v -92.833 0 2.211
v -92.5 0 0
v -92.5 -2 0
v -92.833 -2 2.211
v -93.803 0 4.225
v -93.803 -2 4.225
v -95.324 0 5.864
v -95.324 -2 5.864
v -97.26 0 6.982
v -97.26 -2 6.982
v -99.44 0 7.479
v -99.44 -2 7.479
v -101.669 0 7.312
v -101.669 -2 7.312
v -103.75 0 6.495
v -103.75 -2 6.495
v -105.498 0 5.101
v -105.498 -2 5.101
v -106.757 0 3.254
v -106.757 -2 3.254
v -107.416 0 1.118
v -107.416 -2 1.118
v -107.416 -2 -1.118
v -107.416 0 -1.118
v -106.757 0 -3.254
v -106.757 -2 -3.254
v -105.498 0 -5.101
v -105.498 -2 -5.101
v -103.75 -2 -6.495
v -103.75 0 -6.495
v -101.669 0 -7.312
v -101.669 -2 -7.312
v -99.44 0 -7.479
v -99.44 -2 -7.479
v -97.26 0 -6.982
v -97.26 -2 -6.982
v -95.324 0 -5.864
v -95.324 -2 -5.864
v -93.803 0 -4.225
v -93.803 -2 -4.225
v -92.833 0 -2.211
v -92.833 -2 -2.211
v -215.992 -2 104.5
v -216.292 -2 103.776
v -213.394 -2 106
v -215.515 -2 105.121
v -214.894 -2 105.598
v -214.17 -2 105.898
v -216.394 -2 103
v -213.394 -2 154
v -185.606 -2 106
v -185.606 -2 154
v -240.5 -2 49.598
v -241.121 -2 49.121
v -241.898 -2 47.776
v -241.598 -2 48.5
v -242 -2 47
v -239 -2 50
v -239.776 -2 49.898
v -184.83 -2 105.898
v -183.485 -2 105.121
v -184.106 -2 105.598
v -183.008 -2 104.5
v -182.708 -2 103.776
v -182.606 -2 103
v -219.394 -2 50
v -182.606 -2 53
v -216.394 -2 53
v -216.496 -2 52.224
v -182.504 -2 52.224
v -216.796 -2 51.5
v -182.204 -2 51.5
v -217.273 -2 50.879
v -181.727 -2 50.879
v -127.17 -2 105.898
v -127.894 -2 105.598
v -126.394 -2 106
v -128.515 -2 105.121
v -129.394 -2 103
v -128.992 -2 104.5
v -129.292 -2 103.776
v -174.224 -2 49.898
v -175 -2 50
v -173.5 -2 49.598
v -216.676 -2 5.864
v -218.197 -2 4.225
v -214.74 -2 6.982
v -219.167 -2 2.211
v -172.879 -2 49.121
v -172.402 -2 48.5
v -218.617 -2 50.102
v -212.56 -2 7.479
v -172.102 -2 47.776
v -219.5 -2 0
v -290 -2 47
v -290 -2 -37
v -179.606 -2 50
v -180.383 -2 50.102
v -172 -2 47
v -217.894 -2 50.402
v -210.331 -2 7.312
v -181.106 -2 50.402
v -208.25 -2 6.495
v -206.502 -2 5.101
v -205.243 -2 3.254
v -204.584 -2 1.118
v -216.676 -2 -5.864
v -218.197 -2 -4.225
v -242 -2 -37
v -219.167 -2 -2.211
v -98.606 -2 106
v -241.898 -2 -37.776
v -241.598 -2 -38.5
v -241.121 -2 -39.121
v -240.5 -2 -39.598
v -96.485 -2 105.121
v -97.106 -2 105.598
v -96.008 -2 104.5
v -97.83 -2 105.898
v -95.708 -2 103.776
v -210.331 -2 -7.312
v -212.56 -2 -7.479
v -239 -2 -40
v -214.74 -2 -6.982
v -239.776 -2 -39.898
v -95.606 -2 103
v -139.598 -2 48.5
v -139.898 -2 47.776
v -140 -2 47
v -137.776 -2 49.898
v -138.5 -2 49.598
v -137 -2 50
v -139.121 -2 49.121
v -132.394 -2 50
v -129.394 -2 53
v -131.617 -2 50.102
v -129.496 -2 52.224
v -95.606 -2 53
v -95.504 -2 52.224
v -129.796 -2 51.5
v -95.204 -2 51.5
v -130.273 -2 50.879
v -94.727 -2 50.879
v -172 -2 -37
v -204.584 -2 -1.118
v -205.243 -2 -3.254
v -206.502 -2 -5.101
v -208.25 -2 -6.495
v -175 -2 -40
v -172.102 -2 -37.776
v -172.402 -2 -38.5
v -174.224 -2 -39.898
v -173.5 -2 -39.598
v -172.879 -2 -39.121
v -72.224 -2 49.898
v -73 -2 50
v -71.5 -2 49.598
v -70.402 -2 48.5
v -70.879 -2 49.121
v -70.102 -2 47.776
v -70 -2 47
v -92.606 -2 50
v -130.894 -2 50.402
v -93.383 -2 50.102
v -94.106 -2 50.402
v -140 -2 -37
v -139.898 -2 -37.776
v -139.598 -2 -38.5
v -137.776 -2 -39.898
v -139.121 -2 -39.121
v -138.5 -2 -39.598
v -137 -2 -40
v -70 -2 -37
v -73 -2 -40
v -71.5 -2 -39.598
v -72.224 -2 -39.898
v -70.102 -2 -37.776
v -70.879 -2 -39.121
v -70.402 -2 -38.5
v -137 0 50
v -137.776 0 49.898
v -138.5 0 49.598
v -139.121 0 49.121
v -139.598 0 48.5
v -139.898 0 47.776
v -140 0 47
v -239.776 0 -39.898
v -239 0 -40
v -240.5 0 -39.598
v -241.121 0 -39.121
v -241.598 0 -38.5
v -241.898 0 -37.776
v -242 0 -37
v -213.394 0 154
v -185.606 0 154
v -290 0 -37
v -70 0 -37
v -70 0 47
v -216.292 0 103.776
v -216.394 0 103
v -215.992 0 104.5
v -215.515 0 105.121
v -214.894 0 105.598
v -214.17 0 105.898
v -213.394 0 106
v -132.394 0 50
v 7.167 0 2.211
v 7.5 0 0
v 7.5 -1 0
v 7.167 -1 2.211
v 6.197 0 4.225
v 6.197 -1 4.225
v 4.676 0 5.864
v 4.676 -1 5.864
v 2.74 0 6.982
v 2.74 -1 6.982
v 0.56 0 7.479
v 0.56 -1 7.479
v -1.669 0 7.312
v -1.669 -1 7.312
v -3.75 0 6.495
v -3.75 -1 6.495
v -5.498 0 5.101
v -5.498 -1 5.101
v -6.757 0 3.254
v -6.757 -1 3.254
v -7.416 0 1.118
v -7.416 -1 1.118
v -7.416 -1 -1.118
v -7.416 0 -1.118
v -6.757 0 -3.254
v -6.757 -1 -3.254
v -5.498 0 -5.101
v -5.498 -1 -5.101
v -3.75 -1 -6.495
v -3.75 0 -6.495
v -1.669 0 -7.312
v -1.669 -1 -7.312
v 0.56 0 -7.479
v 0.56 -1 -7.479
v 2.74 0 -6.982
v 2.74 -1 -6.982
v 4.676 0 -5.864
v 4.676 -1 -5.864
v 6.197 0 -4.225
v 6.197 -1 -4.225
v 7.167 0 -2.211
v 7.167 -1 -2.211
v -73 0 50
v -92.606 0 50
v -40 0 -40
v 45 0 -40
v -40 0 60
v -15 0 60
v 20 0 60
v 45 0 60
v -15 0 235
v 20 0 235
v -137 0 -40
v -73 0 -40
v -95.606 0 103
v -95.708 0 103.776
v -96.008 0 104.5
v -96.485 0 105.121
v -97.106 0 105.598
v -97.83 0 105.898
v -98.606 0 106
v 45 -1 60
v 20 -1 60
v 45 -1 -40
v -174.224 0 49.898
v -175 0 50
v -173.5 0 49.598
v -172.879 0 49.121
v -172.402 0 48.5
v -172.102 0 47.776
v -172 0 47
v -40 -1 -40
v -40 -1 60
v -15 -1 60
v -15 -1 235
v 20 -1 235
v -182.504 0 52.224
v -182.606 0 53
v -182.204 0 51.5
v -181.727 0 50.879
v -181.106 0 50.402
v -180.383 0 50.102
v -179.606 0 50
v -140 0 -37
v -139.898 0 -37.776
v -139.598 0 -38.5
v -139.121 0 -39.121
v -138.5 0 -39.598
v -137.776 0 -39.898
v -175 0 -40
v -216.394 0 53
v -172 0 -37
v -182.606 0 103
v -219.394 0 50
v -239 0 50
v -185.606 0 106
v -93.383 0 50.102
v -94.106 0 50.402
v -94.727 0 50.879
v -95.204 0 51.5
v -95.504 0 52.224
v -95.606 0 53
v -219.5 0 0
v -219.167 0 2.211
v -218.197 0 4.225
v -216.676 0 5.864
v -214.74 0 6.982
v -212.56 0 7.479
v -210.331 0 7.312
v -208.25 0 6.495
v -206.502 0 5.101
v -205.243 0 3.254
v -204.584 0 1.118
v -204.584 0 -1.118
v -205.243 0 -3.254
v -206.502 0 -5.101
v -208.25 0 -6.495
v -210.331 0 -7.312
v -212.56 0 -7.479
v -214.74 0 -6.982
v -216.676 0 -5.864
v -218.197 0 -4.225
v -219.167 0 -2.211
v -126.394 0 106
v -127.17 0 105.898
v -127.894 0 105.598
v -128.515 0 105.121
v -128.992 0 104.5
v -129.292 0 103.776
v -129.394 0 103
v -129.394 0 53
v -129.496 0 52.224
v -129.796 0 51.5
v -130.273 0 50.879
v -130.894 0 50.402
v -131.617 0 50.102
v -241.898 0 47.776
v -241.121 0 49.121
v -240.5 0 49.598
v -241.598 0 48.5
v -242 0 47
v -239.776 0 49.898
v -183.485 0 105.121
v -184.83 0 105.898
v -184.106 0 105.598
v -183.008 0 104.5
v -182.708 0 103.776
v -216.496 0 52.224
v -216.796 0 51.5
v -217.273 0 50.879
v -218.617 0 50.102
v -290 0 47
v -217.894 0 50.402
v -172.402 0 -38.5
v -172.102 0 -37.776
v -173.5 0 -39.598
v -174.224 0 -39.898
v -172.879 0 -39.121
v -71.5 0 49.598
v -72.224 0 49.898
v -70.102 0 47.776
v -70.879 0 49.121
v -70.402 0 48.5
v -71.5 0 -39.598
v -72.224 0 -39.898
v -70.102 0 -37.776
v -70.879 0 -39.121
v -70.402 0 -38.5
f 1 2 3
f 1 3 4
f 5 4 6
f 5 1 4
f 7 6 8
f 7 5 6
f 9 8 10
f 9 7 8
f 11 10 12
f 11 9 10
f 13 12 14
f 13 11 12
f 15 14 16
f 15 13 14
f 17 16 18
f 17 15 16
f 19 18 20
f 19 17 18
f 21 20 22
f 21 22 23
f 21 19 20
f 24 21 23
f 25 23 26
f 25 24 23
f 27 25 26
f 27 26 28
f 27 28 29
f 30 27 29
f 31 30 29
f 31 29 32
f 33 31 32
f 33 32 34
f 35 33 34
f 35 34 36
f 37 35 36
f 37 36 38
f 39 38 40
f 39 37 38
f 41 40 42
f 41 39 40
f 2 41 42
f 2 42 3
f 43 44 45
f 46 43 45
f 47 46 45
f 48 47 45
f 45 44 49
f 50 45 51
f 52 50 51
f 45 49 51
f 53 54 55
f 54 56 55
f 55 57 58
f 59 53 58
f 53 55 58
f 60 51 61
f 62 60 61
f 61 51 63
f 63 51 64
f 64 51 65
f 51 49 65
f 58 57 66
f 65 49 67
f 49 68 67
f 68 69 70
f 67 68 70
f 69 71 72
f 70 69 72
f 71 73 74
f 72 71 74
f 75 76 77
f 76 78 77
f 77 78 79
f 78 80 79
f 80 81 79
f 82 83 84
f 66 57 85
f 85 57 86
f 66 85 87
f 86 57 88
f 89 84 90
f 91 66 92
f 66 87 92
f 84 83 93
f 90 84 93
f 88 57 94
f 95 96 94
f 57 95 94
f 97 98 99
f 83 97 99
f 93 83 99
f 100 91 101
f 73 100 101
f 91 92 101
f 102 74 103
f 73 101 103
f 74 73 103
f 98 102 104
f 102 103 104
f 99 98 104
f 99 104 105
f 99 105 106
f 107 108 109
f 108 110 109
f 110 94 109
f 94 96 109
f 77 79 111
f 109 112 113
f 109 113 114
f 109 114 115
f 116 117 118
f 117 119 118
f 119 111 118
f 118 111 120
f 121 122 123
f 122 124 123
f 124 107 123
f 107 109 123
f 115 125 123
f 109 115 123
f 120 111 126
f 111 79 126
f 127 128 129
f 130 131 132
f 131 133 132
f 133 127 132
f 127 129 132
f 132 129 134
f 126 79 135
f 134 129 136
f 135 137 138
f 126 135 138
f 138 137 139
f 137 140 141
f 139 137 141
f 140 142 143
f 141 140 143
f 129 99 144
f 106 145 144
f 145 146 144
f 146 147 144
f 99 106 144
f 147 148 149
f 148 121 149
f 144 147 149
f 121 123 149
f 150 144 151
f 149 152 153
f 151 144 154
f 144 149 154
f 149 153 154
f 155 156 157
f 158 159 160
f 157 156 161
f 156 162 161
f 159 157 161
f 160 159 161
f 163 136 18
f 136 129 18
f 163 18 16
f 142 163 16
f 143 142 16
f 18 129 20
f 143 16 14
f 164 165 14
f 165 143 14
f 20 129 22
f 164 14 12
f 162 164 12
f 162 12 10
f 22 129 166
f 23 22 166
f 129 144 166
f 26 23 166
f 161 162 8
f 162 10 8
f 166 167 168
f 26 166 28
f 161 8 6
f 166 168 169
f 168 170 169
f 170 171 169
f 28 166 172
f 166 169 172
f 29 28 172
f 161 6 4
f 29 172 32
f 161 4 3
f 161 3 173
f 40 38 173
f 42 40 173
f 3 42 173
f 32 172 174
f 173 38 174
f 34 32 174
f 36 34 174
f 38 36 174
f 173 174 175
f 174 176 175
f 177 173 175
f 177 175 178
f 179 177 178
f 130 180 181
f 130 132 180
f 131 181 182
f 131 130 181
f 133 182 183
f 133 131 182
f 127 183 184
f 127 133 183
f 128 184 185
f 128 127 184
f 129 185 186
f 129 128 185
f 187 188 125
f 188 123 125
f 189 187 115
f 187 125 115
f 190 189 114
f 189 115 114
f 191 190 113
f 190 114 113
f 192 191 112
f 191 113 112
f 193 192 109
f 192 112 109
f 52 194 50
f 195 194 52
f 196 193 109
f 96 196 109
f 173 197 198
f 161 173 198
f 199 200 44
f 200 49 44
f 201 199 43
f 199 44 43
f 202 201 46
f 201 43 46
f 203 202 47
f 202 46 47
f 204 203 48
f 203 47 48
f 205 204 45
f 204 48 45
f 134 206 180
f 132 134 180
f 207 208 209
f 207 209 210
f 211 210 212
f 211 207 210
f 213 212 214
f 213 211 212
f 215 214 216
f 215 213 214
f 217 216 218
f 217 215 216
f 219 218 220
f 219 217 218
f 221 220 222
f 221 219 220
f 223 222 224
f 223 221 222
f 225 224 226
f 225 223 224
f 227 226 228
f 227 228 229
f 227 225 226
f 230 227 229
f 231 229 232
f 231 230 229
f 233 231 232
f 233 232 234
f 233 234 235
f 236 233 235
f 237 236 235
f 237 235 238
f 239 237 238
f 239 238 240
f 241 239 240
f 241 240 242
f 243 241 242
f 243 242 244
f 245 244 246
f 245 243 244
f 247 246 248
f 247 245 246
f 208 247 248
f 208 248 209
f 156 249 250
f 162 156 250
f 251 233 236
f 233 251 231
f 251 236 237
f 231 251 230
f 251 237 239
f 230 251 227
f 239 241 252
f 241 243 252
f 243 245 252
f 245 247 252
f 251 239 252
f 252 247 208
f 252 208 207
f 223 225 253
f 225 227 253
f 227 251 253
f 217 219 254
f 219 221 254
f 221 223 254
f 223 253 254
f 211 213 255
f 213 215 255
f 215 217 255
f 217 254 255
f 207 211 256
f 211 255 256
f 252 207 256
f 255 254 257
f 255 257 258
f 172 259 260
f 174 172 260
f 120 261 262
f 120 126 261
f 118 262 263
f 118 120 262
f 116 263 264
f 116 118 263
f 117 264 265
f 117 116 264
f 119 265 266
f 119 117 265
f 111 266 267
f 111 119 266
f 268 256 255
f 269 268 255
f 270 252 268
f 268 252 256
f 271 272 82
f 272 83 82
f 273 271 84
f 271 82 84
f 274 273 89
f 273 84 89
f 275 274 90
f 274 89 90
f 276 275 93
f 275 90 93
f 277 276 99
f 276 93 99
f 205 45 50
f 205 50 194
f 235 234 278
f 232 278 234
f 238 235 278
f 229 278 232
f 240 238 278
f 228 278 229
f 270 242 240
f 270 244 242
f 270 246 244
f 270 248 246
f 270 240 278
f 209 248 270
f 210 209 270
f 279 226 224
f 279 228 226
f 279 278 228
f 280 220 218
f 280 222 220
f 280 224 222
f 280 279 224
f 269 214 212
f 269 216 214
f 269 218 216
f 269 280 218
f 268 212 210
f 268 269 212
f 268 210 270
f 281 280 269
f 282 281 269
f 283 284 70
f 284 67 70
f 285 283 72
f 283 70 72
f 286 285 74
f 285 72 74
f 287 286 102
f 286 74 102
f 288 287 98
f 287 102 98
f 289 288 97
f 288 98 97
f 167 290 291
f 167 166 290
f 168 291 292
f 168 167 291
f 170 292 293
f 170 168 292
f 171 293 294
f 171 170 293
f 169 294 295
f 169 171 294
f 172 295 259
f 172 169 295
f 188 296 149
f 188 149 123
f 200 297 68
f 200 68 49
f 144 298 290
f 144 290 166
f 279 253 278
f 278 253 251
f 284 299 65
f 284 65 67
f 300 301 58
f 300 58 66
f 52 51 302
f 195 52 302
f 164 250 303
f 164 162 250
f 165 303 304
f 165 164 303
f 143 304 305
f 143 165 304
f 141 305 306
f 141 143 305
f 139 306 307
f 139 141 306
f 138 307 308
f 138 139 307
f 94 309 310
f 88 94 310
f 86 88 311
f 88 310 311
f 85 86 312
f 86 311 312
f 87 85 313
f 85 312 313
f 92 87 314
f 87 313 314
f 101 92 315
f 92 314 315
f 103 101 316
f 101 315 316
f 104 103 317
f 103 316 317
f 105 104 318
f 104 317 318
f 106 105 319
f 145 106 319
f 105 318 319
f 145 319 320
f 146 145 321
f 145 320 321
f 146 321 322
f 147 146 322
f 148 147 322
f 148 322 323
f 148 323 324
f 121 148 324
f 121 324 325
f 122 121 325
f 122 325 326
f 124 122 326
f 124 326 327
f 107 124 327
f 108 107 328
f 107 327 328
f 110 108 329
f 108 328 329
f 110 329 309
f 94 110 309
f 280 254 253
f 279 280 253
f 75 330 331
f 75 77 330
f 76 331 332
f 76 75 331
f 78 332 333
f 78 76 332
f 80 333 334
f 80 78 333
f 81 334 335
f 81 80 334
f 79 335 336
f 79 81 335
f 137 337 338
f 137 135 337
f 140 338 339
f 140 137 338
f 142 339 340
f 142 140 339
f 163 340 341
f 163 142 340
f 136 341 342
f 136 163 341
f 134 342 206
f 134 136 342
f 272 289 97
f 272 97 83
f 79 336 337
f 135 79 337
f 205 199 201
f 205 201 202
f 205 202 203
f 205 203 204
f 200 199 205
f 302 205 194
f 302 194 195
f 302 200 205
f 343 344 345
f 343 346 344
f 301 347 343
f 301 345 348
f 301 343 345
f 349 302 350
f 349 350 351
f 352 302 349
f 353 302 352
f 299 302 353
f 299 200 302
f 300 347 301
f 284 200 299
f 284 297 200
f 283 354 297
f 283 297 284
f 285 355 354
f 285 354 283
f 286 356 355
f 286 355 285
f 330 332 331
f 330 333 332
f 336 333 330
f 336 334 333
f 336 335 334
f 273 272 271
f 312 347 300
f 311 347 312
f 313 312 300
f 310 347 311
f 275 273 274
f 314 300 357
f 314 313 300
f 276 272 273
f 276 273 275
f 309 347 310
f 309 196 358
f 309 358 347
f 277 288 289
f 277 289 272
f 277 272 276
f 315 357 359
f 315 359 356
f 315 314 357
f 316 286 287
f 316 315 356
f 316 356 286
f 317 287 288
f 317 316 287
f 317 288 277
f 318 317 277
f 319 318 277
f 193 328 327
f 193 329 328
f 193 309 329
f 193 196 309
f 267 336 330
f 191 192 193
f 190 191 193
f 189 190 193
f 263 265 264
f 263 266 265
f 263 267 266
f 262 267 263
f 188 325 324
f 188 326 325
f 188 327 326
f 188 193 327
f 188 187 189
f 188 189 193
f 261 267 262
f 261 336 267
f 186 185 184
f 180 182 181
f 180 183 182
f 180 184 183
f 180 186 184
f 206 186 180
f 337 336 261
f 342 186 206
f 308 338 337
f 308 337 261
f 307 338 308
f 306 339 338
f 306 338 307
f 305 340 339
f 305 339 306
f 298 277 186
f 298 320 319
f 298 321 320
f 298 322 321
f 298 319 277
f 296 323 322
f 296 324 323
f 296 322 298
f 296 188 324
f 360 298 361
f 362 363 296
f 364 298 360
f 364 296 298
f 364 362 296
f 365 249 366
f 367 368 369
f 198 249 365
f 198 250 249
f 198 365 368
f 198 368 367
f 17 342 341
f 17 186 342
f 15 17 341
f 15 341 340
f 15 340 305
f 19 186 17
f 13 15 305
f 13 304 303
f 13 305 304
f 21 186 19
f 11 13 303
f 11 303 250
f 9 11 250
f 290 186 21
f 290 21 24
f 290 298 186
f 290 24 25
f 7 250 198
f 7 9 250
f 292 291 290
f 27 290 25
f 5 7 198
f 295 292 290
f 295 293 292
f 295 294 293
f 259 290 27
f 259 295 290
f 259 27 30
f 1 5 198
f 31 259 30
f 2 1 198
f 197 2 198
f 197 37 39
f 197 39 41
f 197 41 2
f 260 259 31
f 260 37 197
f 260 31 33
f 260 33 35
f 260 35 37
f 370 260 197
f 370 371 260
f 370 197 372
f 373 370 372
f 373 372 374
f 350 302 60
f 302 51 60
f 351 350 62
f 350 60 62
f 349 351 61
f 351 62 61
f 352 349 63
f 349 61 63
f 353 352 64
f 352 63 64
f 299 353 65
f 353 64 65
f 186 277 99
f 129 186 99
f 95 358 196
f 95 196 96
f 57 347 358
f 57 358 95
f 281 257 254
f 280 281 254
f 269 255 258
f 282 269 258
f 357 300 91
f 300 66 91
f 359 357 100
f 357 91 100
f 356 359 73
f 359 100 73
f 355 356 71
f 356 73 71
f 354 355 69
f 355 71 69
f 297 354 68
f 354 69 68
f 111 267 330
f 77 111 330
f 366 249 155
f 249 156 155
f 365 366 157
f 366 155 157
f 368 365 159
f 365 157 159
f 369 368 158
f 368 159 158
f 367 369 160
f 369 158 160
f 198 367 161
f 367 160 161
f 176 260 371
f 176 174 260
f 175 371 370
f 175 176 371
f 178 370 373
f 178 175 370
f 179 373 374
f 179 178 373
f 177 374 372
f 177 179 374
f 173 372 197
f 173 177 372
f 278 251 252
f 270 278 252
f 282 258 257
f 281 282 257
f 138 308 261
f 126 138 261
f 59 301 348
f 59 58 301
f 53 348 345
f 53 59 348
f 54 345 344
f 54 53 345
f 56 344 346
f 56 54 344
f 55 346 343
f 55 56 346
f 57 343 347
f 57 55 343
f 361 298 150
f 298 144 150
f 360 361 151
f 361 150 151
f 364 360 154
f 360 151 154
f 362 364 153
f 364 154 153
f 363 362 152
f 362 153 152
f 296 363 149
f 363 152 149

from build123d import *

# Parameters (mm, degrees)
F0_R      = 7.5
F1_DEPTH  = 1
F2_R      = 7.5
F2_W      = 19
F2_H      = 48
F2_H_2    = 20
F3_DEPTH  = 2
F4_R      = 3
F5_W      = 2
F5_H      = 84
F6_DEPTH  = 16
F8_W      = 2
F8_H      = 84
F9_DEPTH  = 48
F10_W     = 27.787754
F10_H     = 2
F11_DEPTH = 48


with BuildPart() as f1:
    # F0 (on Front) → F1 (new body)
    with BuildSketch(Plane.XZ):
        Polygon((45, 60), (20, 60), (20, 235), (-15, 235), (-15, 60), (-40, 60), (-40, -40), (45, -40), align=None)
        Circle(F0_R, mode=Mode.SUBTRACT)
    extrude(amount=F1_DEPTH)


with BuildPart() as f3:
    # F2 (on Front) → F3 (new body)
    with BuildSketch(Plane.XZ):
        Polygon((-103, 50), (-103, 30), (-122, 30), (-122, 50), (-129.393877, 50), (-140, 50), (-140, -40), (-70, -40), (-70, 50), (-95.606123, 50), align=None)
        with Locations((-100, 0)):
            Circle(F2_R, mode=Mode.SUBTRACT)
        Polygon((-103, 98), (-103, 50), (-95.606123, 50), (-95.606123, 106), (-129.393877, 106), (-129.393877, 50), (-122, 50), (-122, 98), align=None)
        with Locations((-112.5, 74)):
            Rectangle(F2_W, F2_H)
        with Locations((-112.5, 40)):
            Rectangle(F2_W, F2_H_2)
    extrude(amount=F3_DEPTH)

    # F4
    f4_edges = [f3.edges().sort_by_distance(p)[0] for p in [
        (-129.393877, -1, 50),
        (-129.393877, -1, 106),
        (-95.606123, -1, 106),
        (-95.606123, -1, 50),
        (-70, -1, 50),
        (-140, -1, 50),
        (-140, -1, -40),
        (-70, -1, -40),
    ]]
    fillet(f4_edges, radius=F4_R)

    # F5 (on face) → F6 (join)
    with BuildSketch(Plane(origin=(-140, 0, 0), x_dir=(0, -1, 0), z_dir=(-1, 0, 0))):
        with Locations((1, 5)):
            Rectangle(F5_W, F5_H)
    extrude(amount=F6_DEPTH)

    # F7: F3 across face


with BuildPart() as f3_1:
    add(f3.part)
    add(f3.part.mirror(Plane(origin=(-156, -1, 5), x_dir=(0, -1, 0), z_dir=(-1, 0, 0))))

    # F8 (on face) → F9 (join)
    with BuildSketch(Plane(origin=(-242, 0, 0), x_dir=(0, -1, 0), z_dir=(-1, 0, 0))):
        with Locations((1, 5)):
            Rectangle(F8_W, F8_H)
    extrude(amount=F9_DEPTH)

    # F10 (on face) → F11 (join)
    with BuildSketch(Plane.XY.offset(106)):
        with Locations((-199.5, -1)):
            Rectangle(F10_W, F10_H)
    extrude(amount=F11_DEPTH)


solid = Compound([f1.part, f3_1.part])
